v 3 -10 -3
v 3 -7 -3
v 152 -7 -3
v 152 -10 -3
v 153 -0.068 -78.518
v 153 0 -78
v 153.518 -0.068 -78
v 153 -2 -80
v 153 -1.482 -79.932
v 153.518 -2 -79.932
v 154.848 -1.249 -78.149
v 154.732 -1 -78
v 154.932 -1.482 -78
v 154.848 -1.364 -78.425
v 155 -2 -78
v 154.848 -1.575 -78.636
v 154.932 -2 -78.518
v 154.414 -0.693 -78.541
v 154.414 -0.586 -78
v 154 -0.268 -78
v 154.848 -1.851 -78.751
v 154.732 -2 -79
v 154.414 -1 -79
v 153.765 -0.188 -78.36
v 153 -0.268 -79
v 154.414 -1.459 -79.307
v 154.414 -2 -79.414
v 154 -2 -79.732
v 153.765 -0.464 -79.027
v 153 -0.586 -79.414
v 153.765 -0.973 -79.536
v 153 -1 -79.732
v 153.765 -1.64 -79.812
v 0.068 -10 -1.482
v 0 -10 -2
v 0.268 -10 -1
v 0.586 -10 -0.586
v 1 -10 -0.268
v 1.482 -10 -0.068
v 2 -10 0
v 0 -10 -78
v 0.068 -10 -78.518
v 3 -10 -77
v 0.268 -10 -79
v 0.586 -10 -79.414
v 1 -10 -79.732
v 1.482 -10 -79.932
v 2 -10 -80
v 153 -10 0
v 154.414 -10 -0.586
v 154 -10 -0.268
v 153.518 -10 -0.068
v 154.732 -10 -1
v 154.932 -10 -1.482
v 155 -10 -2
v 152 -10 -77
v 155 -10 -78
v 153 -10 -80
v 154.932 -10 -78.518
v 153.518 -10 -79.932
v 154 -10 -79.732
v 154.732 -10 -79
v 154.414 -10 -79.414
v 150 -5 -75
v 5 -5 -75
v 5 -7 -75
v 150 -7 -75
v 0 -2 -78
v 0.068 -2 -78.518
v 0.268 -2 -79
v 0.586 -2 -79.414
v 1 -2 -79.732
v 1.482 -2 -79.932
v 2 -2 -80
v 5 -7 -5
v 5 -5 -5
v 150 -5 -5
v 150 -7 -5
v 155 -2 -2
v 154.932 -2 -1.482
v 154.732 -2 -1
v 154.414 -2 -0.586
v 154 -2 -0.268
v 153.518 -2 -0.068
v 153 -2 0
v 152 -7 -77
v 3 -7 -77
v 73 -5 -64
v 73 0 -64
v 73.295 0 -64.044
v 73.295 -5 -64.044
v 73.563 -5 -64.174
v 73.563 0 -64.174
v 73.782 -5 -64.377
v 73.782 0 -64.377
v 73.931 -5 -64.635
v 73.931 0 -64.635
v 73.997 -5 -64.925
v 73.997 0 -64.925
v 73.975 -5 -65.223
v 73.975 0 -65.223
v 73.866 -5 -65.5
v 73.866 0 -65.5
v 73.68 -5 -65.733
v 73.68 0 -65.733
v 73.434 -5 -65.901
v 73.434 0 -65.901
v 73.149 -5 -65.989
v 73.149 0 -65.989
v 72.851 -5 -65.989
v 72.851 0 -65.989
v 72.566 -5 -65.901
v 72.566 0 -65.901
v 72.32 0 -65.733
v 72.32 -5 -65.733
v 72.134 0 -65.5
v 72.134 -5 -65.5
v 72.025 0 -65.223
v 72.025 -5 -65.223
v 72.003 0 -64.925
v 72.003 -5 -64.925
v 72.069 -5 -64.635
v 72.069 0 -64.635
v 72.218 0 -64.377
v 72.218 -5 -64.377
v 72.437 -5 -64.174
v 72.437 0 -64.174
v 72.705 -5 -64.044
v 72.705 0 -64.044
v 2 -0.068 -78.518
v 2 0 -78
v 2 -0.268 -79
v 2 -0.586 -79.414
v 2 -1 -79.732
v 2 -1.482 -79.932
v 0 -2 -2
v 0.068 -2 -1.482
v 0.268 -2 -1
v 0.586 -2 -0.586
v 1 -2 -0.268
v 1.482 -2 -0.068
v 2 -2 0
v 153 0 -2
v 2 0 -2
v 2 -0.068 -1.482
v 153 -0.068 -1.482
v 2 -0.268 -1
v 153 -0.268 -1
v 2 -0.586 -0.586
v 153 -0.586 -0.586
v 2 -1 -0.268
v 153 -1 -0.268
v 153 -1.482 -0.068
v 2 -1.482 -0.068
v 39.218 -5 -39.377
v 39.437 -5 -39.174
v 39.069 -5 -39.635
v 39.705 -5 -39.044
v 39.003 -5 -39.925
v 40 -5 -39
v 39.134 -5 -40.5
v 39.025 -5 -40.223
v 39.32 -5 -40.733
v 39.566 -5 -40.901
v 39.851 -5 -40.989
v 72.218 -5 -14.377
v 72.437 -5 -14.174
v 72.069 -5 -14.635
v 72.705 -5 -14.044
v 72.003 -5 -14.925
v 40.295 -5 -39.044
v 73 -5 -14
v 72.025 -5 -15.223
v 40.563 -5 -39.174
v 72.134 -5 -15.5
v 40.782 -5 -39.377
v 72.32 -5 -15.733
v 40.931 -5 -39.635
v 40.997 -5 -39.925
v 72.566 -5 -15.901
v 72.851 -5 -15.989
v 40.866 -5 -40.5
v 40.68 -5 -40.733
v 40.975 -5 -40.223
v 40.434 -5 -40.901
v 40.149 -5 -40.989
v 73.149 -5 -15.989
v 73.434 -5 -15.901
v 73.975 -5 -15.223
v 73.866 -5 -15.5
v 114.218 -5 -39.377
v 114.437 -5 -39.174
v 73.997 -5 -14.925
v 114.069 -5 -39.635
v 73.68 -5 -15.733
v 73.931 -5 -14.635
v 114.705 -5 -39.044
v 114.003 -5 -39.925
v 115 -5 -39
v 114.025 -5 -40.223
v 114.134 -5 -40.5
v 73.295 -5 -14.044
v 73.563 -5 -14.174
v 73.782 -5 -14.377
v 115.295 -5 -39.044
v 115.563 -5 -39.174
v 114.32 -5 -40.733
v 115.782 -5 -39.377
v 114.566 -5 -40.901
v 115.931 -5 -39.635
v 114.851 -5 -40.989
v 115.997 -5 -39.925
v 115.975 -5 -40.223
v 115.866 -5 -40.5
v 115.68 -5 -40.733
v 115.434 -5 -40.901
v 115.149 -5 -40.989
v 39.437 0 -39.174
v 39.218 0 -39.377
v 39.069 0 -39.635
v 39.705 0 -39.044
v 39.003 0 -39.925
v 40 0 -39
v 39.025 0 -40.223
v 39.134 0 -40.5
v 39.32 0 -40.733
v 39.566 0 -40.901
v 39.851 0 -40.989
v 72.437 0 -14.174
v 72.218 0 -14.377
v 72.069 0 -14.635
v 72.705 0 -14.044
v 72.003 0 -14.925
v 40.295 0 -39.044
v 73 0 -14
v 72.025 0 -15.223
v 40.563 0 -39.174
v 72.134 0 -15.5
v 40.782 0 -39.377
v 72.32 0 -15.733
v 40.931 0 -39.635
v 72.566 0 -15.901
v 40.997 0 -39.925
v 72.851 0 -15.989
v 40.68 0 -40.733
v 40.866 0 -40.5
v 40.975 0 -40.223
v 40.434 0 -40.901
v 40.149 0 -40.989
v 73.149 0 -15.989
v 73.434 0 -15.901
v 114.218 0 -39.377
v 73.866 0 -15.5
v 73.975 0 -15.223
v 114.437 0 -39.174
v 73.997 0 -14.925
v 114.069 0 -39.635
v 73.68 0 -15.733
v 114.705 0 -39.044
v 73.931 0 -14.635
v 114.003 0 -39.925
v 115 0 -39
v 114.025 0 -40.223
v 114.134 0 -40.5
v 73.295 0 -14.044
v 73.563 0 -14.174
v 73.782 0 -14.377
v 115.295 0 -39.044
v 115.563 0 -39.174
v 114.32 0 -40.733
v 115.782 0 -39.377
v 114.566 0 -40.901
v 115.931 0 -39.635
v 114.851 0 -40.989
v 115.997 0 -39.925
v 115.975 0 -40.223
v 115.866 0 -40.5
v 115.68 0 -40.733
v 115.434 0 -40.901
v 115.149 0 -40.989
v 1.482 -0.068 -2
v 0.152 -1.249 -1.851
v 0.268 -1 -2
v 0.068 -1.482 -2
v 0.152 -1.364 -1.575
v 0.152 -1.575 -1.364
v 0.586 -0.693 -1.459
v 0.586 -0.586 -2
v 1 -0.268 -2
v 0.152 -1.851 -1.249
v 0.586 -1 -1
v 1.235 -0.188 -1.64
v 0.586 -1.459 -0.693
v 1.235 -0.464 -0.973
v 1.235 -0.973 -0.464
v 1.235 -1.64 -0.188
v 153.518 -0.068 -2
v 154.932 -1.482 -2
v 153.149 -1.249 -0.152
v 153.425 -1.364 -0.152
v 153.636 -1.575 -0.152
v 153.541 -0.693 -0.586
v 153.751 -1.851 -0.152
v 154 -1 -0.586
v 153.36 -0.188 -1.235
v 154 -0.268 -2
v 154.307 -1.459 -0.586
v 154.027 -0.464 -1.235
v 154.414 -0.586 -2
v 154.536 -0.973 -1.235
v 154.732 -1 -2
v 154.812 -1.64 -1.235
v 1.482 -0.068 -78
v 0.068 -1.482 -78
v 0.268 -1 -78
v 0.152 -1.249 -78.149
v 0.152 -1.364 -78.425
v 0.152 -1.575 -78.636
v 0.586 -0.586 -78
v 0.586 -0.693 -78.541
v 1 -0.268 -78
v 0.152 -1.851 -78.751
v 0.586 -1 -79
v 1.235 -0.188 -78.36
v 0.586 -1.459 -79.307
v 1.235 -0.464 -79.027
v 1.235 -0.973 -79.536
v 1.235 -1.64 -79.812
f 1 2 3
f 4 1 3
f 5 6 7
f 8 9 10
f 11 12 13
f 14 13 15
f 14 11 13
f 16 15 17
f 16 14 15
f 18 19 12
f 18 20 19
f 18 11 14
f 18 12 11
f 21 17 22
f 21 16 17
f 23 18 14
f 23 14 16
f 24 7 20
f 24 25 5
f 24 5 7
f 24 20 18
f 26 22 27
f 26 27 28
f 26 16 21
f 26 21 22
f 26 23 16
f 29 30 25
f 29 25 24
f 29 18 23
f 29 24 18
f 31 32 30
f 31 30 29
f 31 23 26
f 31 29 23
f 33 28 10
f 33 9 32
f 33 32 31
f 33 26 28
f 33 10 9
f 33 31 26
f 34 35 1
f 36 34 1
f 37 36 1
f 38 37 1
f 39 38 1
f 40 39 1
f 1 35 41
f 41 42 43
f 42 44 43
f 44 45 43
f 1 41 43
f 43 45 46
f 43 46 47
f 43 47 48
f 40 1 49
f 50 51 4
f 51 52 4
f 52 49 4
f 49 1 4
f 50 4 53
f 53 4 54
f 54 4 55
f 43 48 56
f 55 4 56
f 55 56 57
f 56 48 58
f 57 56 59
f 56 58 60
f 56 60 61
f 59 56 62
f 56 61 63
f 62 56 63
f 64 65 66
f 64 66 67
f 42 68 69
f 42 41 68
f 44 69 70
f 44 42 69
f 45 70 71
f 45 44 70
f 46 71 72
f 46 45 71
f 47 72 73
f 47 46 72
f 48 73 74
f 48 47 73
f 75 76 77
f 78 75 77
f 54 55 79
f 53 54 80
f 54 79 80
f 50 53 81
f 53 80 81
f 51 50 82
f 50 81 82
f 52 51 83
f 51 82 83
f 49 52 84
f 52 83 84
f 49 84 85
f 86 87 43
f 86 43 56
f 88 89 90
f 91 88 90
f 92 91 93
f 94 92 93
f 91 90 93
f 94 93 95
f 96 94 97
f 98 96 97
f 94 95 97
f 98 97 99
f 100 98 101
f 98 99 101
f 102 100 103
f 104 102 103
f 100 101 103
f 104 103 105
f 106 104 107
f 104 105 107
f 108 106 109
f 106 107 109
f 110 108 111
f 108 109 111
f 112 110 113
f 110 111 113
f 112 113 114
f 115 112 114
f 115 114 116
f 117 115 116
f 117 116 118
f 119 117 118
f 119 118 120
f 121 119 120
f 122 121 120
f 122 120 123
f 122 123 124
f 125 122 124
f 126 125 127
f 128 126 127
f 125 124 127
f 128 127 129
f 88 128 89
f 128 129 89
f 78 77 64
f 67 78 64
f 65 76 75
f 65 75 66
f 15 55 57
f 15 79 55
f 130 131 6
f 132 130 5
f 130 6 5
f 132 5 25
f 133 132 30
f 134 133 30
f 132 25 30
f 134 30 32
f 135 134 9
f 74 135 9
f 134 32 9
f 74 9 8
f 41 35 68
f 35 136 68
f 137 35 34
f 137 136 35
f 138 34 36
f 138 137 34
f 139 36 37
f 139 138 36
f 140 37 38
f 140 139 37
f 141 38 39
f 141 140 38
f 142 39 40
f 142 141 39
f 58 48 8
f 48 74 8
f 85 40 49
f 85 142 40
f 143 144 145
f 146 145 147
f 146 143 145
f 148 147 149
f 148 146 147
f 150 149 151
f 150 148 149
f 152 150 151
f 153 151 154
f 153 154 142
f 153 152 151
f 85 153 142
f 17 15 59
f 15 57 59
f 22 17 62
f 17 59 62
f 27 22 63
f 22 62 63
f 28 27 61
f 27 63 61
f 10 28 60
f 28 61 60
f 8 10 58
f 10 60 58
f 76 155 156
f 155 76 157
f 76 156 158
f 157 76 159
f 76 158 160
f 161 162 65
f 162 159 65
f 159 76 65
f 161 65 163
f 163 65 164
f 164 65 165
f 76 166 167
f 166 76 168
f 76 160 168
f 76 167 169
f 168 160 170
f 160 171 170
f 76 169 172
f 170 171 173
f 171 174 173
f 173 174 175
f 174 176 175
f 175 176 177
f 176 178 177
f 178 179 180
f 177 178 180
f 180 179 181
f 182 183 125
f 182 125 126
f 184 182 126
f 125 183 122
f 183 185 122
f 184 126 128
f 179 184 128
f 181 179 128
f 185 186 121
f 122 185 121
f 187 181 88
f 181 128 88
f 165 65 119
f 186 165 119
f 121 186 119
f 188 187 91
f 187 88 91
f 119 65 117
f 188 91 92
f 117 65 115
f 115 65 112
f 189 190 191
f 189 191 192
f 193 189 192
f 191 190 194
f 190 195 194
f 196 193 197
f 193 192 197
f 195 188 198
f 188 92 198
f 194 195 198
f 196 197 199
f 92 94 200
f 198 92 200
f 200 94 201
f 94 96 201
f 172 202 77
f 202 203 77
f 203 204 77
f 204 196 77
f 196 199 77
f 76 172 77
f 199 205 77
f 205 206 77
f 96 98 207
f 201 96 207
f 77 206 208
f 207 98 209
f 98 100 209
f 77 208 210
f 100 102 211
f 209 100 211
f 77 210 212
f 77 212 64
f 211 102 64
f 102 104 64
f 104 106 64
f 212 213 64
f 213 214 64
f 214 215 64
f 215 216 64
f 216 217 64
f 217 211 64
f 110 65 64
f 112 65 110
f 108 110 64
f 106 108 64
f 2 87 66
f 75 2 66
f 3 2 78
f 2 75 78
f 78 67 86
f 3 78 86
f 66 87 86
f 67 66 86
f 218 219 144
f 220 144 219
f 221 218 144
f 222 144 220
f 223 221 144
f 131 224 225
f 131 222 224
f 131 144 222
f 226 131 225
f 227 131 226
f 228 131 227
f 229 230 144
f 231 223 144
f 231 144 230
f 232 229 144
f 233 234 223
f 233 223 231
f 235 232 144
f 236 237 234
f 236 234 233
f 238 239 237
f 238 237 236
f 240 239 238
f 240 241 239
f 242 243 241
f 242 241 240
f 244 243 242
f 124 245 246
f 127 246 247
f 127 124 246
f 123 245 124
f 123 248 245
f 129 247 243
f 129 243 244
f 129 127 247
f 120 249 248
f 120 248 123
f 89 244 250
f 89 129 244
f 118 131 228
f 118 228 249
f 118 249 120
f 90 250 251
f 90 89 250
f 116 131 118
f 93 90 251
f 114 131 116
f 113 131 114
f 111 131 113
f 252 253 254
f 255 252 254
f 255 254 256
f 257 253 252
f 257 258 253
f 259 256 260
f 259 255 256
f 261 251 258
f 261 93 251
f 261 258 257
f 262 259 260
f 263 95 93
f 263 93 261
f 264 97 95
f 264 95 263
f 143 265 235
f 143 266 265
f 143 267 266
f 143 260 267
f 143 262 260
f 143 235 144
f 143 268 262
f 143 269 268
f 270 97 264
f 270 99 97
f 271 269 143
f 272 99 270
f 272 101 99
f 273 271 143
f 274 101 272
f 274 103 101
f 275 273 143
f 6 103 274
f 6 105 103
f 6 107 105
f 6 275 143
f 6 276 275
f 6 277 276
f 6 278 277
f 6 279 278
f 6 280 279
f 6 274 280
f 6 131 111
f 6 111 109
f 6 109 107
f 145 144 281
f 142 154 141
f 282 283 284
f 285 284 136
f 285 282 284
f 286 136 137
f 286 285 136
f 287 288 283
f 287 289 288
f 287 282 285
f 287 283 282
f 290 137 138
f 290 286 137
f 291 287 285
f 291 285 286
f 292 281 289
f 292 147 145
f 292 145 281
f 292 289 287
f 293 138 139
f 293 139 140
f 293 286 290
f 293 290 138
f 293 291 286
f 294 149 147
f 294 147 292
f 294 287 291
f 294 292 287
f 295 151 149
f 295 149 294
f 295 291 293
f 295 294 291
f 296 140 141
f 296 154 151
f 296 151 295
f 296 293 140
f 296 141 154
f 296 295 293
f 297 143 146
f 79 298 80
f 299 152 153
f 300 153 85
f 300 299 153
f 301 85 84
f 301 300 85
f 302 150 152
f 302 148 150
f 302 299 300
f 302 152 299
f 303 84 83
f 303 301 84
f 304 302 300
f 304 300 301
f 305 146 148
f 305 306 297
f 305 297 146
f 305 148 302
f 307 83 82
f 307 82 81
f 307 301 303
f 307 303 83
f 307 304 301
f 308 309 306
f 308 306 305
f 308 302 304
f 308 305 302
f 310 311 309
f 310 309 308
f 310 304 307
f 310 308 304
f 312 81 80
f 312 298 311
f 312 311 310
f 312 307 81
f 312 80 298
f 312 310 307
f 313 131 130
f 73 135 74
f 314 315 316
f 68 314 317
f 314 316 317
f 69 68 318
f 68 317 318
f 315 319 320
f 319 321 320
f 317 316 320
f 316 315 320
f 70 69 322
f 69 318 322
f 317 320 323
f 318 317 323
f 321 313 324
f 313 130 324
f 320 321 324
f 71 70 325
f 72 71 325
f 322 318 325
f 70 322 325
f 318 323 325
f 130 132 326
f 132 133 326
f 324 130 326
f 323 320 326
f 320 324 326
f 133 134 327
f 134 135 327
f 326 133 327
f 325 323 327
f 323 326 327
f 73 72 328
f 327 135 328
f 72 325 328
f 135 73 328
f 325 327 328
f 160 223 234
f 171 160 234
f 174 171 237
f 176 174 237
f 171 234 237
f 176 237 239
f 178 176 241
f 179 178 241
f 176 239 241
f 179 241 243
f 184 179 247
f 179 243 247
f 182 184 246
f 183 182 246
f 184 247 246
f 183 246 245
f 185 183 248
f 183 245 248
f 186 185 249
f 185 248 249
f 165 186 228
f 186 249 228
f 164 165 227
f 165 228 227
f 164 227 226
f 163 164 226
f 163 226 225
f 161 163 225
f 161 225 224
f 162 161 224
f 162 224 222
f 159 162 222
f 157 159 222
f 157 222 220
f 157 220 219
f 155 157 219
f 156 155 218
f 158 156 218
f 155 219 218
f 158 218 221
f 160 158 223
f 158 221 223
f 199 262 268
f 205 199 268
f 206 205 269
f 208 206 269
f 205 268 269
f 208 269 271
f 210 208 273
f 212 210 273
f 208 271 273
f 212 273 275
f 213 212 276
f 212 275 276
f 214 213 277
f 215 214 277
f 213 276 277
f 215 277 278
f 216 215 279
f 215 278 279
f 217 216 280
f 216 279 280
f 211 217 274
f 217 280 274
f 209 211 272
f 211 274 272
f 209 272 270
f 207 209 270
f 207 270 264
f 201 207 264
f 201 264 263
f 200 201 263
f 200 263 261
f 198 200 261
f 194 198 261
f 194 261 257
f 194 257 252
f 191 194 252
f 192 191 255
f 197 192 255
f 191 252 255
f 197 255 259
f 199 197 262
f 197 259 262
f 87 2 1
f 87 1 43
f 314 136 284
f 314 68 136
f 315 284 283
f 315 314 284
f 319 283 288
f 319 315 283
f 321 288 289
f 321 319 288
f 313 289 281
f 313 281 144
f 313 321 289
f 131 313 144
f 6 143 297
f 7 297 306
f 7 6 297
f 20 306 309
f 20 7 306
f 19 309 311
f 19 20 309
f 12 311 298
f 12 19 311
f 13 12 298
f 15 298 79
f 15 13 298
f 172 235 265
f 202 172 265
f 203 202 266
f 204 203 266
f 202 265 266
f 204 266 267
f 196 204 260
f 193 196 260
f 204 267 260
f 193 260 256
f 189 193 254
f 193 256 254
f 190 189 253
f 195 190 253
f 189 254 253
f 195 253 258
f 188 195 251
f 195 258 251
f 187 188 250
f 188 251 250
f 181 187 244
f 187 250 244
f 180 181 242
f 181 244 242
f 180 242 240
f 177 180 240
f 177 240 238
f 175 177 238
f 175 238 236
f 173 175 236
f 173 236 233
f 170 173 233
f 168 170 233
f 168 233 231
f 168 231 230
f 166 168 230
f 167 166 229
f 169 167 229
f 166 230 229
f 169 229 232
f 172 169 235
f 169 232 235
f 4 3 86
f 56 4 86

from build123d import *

# Parameters (mm, degrees)
SKETCH2_W           = 155
SKETCH2_H           = 80
SKETCH2_R           = 1
BOSS_EXTRUDE1_DEPTH = 5
SKETCH3_W           = 155
SKETCH3_H           = 80
SKETCH3_W_2         = 149
SKETCH3_H_2         = 74
BOSS_EXTRUDE2_DEPTH = 10
SKETCH4_W           = 155
SKETCH4_H           = 80
SKETCH4_W_2         = 145
SKETCH4_H_2         = 70
BOSS_EXTRUDE3_DEPTH = 7
FILLET1_R           = 2


with BuildPart() as part:
    # Sketch2 → Boss-Extrude1 (new body)
    with BuildSketch(Plane(origin=(0, 0, 0), x_dir=(1, 0, 0), z_dir=(0, 1, 0))):
        with Locations((77.5, 40)):
            Rectangle(SKETCH2_W, SKETCH2_H)
        with Locations(Location((40, 40, 0), (0, 0, 270))):  # turned: the seam where the file's is
            Circle(SKETCH2_R, mode=Mode.SUBTRACT)
        with Locations(Location((115, 40, 0), (0, 0, 270))):  # turned: the seam where the file's is
            Circle(SKETCH2_R, mode=Mode.SUBTRACT)
        with Locations(Location((73, 65, 0), (0, 0, 270))):  # turned: the seam where the file's is
            Circle(SKETCH2_R, mode=Mode.SUBTRACT)
        with Locations(Location((73, 15, 0), (0, 0, 270))):  # turned: the seam where the file's is
            Circle(SKETCH2_R, mode=Mode.SUBTRACT)
    extrude(amount=-BOSS_EXTRUDE1_DEPTH)

    # Sketch3 → Boss-Extrude2 (add)
    with BuildSketch(Plane(origin=(0, 0, 0), x_dir=(1, 0, 0), z_dir=(0, 1, 0))):
        with Locations((77.5, 40)):
            Rectangle(SKETCH3_W, SKETCH3_H)
        with Locations((77.5, 40)):
            Rectangle(SKETCH3_W_2, SKETCH3_H_2, mode=Mode.SUBTRACT)
    extrude(amount=-BOSS_EXTRUDE2_DEPTH)

    # Sketch4 → Boss-Extrude3 (add)
    with BuildSketch(Plane(origin=(0, 0, 0), x_dir=(1, 0, 0), z_dir=(0, 1, 0))):
        with Locations((77.5, 40)):
            Rectangle(SKETCH4_W, SKETCH4_H)
        with Locations((77.5, 40)):
            Rectangle(SKETCH4_W_2, SKETCH4_H_2, mode=Mode.SUBTRACT)
    extrude(amount=-BOSS_EXTRUDE3_DEPTH)

    # Fillet1
    fillet1_edges = [part.edges().sort_by_distance(p)[0] for p in [
        (77.5, 0, -80),
        (155, 0, -40),
        (77.5, 0, 0),
        (0, 0, -40),
        (0, -5, -80),
        (155, -5, -80),
        (155, -5, 0),
        (0, -5, 0),
    ]]
    fillet(fillet1_edges, radius=FILLET1_R)


solid = part.part
